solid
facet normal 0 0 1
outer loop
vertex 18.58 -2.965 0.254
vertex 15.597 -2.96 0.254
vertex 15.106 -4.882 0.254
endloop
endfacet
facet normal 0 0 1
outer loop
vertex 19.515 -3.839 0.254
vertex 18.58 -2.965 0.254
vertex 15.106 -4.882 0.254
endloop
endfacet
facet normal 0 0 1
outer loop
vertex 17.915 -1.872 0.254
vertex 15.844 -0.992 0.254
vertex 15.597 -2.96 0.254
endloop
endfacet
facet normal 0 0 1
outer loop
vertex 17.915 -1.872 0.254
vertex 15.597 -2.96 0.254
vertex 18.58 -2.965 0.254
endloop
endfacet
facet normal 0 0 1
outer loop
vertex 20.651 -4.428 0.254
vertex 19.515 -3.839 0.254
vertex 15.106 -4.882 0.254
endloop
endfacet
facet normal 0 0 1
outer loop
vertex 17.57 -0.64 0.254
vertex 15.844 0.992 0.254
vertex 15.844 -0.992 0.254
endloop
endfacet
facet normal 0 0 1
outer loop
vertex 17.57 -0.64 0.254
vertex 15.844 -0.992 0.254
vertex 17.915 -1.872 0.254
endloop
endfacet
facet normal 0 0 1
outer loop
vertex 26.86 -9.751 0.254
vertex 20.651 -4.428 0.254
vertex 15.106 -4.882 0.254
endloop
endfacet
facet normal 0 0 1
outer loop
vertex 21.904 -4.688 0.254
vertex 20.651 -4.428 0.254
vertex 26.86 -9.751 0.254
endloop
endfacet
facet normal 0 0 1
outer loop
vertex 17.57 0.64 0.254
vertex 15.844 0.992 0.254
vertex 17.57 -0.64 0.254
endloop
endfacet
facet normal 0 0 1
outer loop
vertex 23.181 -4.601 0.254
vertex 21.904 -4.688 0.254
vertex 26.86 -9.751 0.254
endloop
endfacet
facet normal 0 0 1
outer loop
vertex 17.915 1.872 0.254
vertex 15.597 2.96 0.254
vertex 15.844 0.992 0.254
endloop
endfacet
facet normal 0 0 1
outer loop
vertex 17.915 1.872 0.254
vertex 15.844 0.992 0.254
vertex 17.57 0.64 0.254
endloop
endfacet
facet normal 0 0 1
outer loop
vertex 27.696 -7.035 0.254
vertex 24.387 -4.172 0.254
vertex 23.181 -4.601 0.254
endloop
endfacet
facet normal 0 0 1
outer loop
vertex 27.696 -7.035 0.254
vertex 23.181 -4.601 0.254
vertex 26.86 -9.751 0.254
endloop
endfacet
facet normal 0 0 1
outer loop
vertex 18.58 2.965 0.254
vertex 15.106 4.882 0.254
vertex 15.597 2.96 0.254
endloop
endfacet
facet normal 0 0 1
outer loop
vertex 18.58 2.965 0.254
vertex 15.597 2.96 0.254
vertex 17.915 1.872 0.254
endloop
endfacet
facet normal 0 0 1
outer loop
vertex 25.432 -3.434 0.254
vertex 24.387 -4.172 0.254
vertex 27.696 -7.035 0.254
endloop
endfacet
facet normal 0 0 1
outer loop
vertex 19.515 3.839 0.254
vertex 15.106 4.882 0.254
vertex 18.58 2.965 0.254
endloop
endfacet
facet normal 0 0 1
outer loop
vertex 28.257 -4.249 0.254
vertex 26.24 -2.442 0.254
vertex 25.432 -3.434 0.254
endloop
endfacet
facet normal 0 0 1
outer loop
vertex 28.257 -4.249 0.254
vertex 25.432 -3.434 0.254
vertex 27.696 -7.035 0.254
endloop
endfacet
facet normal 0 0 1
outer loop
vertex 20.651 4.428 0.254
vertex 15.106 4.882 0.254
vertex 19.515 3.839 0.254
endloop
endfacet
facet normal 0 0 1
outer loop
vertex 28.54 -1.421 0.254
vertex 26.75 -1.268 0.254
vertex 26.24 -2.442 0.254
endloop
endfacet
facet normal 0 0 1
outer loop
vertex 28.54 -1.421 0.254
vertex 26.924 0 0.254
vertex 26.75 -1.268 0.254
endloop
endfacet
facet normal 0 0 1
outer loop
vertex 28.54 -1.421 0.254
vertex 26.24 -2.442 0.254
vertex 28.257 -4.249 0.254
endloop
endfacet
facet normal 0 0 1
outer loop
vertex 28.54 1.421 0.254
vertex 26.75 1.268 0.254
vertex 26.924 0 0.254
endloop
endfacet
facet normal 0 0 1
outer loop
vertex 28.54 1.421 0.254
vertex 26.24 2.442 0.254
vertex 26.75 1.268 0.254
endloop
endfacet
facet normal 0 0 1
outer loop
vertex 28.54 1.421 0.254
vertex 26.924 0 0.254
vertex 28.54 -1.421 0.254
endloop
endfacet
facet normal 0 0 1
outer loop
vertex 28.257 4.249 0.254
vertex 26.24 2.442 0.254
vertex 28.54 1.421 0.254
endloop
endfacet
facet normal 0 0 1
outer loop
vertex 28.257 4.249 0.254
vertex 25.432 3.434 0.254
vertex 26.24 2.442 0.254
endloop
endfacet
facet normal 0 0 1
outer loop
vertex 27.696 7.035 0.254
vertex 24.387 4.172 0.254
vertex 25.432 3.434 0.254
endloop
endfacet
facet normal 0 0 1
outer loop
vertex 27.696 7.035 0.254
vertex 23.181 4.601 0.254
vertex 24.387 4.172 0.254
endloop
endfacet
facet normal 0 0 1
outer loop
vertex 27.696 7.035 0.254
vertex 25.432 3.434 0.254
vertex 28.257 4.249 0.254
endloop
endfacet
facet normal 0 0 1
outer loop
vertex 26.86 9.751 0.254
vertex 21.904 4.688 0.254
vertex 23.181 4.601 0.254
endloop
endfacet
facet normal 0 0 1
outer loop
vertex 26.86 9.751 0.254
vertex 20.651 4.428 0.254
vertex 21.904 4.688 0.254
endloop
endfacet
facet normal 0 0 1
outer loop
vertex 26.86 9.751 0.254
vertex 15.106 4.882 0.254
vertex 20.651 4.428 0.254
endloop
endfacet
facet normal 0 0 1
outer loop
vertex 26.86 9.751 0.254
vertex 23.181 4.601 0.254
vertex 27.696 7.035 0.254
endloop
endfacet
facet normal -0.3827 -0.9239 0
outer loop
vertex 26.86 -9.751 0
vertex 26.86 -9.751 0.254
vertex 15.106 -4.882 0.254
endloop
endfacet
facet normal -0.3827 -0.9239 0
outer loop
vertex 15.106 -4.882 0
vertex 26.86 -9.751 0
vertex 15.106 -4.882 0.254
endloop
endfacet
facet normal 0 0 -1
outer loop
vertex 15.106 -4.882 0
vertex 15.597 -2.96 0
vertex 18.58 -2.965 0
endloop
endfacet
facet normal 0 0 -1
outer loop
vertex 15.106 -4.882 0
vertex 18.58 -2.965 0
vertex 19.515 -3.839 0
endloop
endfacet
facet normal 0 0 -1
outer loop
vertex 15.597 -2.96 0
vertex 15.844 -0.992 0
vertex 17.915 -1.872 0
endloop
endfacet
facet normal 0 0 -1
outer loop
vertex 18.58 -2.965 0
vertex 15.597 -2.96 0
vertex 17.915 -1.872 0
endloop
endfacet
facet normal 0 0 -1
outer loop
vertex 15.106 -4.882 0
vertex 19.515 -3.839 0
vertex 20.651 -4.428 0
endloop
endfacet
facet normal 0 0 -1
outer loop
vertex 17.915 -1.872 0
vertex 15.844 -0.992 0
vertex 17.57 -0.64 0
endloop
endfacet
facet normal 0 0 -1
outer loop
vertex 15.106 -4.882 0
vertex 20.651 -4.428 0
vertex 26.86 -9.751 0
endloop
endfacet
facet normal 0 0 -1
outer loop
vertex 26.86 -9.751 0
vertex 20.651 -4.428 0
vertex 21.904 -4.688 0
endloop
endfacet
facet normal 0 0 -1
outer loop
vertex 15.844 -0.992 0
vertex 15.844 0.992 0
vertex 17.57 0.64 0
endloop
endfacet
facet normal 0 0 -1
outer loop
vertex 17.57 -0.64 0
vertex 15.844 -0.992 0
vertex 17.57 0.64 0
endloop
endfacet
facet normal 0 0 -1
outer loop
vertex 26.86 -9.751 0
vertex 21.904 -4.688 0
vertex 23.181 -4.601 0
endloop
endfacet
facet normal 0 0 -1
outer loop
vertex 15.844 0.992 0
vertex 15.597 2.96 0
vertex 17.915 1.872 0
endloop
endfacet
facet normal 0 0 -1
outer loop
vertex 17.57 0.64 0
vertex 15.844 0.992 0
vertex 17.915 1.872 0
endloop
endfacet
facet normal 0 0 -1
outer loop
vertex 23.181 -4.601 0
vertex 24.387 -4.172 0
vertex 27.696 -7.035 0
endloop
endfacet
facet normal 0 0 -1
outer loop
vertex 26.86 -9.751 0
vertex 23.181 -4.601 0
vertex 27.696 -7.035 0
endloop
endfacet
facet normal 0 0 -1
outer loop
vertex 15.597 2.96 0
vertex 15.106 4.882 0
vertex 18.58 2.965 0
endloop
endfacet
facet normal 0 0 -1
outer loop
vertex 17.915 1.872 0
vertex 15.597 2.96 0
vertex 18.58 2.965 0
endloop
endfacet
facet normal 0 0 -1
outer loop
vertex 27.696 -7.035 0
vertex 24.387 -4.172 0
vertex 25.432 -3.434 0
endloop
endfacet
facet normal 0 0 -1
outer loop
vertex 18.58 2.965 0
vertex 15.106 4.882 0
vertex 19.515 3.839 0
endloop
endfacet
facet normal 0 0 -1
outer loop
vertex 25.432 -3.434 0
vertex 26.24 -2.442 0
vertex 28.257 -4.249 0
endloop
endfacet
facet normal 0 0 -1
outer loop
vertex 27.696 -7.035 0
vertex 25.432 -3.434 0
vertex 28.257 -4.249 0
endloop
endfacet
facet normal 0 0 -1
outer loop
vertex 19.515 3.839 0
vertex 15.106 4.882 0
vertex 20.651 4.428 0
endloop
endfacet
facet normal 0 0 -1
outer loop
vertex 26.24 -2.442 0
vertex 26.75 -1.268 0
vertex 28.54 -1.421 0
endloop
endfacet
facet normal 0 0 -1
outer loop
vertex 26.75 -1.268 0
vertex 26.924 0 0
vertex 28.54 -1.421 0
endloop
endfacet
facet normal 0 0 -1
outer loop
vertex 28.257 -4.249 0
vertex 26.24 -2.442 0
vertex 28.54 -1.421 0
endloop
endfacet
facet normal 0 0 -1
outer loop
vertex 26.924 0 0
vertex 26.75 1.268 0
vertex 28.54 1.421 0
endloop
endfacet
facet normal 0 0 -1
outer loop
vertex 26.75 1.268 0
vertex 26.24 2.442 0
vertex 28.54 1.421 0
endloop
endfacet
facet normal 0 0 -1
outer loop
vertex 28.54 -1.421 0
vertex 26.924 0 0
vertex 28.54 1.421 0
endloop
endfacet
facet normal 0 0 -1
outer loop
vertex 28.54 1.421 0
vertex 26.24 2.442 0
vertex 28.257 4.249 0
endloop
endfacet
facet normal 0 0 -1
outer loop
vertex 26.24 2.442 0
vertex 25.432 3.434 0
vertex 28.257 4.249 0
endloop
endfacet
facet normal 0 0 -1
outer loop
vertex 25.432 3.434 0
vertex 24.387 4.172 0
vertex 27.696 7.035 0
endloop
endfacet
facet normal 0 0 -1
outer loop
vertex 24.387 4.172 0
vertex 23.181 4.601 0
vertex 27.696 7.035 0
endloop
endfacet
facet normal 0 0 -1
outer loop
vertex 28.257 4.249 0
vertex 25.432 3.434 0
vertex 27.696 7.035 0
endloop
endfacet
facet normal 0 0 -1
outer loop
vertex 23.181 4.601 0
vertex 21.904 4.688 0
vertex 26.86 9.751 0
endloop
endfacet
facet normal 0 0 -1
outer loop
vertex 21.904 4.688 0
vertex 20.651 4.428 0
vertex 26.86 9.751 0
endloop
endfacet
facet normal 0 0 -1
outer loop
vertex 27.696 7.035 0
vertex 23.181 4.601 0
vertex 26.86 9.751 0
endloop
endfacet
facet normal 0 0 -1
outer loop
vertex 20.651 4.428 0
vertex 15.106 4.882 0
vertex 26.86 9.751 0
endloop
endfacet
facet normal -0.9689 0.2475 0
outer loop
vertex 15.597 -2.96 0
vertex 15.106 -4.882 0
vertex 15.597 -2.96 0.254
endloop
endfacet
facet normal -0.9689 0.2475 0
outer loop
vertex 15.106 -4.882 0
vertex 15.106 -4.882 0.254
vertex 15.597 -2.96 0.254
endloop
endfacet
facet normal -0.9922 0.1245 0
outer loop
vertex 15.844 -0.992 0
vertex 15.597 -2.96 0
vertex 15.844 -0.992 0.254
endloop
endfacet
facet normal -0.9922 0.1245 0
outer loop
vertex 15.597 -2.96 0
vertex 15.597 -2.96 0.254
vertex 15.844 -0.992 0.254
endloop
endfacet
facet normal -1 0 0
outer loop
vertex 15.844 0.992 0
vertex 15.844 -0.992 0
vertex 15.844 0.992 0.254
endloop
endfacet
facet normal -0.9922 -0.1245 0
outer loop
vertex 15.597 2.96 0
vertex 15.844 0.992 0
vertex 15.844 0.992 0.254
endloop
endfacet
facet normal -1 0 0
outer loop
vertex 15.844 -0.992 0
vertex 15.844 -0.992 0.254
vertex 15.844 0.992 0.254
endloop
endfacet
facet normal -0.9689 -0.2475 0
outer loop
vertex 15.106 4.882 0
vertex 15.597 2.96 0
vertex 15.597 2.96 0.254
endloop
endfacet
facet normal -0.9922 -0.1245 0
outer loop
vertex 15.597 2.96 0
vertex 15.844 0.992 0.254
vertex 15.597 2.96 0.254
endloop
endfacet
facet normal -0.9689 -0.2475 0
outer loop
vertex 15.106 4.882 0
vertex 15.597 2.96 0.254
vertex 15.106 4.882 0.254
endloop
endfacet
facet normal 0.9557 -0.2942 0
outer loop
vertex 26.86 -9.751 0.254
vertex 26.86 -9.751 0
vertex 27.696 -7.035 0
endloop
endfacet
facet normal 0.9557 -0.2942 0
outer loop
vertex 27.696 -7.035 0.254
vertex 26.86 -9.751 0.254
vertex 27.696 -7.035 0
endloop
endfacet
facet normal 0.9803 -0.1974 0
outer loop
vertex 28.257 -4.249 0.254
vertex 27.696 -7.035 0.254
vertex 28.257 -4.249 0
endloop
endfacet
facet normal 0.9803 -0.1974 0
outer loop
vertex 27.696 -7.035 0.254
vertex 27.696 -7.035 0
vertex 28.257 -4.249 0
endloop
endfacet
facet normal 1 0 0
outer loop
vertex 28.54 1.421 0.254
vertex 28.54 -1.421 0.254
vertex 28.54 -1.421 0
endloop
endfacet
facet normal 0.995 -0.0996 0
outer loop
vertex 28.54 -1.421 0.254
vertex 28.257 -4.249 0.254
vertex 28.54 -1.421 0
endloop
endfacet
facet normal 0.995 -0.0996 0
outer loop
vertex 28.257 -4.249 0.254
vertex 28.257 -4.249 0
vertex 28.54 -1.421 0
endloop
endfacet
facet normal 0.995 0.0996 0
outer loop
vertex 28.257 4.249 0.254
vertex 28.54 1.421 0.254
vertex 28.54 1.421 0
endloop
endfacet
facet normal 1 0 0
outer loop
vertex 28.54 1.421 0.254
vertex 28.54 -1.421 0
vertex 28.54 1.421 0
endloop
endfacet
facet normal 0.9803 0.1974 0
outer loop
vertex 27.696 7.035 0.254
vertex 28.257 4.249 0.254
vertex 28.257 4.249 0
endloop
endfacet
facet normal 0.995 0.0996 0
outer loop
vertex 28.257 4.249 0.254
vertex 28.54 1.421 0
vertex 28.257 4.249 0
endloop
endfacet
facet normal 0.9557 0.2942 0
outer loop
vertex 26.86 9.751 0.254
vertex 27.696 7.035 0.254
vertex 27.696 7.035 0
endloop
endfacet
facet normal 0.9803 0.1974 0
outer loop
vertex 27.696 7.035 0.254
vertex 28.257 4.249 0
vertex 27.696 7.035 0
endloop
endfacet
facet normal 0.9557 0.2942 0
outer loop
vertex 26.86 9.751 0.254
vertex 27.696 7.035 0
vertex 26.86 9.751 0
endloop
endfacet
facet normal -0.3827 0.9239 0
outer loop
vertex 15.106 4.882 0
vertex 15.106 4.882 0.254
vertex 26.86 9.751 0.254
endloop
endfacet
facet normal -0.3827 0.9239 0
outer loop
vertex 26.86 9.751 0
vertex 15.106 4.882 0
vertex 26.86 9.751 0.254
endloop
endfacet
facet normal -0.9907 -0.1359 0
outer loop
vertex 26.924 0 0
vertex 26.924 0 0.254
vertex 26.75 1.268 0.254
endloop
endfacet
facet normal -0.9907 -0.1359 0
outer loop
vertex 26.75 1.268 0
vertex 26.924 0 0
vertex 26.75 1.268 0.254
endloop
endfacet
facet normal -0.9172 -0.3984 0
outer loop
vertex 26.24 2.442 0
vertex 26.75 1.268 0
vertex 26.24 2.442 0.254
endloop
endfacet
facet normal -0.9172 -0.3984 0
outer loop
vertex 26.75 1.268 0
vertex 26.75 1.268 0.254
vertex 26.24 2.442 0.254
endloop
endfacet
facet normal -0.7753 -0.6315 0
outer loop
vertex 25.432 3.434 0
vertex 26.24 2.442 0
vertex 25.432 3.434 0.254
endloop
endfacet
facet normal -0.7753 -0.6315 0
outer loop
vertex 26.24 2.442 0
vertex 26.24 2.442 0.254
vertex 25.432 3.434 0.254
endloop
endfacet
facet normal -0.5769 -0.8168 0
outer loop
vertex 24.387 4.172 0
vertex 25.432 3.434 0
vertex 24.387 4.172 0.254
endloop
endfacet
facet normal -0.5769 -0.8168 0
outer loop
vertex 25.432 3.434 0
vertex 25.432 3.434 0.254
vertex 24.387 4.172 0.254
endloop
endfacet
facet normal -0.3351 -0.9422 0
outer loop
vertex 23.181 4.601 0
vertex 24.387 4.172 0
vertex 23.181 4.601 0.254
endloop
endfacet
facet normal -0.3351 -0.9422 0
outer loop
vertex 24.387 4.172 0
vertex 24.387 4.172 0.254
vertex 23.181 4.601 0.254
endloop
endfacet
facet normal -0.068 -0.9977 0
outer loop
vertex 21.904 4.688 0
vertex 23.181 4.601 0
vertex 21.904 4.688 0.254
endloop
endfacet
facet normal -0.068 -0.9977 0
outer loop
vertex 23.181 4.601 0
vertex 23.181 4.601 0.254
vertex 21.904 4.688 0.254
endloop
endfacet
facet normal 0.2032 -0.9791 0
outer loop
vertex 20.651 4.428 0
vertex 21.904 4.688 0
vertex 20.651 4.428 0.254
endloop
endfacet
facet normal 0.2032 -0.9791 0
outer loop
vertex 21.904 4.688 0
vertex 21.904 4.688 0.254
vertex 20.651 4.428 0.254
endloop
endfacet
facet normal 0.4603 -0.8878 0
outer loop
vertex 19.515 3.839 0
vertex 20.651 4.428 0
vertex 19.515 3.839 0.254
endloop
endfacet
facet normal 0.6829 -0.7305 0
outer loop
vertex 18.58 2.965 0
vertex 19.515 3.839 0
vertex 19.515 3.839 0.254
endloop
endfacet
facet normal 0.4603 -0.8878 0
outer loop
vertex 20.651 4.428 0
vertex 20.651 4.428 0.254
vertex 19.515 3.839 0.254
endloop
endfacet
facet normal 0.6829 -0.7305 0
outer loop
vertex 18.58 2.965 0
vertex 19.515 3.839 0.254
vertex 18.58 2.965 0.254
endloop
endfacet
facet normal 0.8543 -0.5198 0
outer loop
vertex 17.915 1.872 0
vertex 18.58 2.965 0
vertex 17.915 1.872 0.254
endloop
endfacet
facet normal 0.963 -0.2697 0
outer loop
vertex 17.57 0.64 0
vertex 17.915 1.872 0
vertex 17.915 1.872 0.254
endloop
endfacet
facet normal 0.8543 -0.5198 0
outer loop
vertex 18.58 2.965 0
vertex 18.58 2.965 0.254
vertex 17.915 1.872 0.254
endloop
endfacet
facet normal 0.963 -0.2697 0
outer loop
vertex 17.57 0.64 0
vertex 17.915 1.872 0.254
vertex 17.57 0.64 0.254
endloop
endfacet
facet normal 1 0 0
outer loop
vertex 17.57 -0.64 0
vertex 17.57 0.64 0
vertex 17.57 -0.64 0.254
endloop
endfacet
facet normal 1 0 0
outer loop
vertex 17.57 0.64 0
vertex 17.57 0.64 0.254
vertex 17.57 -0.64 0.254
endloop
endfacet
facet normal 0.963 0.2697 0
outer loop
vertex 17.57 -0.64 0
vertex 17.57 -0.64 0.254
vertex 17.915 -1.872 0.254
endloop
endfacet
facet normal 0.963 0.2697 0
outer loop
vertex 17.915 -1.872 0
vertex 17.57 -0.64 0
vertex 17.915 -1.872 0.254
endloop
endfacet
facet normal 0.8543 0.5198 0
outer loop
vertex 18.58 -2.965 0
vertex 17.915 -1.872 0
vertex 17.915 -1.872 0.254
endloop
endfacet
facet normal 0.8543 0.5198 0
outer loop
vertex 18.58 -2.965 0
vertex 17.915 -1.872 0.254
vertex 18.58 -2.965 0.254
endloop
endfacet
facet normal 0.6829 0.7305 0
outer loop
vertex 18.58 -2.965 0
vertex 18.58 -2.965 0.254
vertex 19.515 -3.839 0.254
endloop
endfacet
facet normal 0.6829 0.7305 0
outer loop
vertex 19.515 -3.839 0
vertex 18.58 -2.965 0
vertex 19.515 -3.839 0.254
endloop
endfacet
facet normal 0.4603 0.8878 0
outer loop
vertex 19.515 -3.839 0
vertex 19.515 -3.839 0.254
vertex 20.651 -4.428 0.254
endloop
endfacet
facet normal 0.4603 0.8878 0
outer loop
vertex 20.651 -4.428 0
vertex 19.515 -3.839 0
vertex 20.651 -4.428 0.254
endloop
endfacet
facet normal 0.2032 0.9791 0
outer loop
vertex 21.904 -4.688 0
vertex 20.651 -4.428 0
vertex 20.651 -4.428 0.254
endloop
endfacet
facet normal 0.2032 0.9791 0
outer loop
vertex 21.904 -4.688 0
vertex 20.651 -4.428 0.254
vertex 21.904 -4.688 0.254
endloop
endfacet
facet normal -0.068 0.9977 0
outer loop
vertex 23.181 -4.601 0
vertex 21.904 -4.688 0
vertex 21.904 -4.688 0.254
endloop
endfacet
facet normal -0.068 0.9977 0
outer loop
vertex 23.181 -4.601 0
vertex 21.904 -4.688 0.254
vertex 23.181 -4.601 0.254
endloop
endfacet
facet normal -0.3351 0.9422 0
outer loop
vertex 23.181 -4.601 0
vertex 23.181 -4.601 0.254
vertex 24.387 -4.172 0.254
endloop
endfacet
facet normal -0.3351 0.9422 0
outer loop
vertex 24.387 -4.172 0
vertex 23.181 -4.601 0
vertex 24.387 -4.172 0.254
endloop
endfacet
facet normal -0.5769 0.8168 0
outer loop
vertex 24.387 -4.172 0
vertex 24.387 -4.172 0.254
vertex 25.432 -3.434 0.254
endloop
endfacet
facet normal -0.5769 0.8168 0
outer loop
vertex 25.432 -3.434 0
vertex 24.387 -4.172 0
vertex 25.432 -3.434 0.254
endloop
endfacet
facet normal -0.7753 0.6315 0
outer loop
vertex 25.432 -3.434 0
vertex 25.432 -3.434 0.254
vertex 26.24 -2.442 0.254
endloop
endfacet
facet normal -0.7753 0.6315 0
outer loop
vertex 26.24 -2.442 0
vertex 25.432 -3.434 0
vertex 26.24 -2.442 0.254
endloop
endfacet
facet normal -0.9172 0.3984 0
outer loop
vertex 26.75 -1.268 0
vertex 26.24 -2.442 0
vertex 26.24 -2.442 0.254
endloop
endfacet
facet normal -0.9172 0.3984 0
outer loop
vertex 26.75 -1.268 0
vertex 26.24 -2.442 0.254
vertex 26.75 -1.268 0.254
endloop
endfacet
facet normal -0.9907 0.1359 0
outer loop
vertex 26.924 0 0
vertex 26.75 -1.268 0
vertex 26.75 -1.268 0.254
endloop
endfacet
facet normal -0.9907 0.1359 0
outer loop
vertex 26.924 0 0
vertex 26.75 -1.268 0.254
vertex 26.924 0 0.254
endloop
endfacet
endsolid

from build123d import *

# Parameters (mm, degrees)
SKETCH4_R           = 28.575
BOSS_EXTRUDE2_DEPTH = 0.254
SKETCH5_R           = 15.875
CUT_EXTRUDE5_DEPTH  = 1.254
SKETCH6_R           = 4.699
CUT_EXTRUDE6_DEPTH  = 1.254
SKETCH8_OUTSIDE_W   = 75.314
SKETCH8_OUTSIDE_H   = 75.314
CUT_EXTRUDE11_DEPTH = 1.254


with BuildPart() as part:
    # Sketch4 → Boss-Extrude2 (new body)
    with BuildSketch(Plane.XY):
        Circle(SKETCH4_R)
    extrude(amount=BOSS_EXTRUDE2_DEPTH)

    # Sketch5 → Cut-Extrude5 (cut, through all)
    with BuildSketch(Plane.XY.offset(0.254)):
        Circle(SKETCH5_R)
    extrude(amount=-CUT_EXTRUDE5_DEPTH, mode=Mode.SUBTRACT)

    # Sketch6 → Cut-Extrude6 (cut, through all)
    with BuildSketch(Plane.XY.offset(0.254)):
        with Locations((22.225, 0)):
            Circle(SKETCH6_R)
    extrude(amount=-CUT_EXTRUDE6_DEPTH, mode=Mode.SUBTRACT)

    # Sketch8 outside → Cut-Extrude11 (cut, through all)
    with BuildSketch(Plane.XY.offset(0.254)):
        Rectangle(SKETCH8_OUTSIDE_W, SKETCH8_OUTSIDE_H)
        with BuildLine():
            Line((15.105587123, 4.88230096), (26.859778778, 9.751046558))
            ThreePointArc((26.859778778, 9.751046558), (28.575, 0), (26.859778778, -9.751046558))
            Line((26.859778778, -9.751046558), (15.105587123, -4.88230096))
            ThreePointArc((15.105587123, -4.88230096), (15.875, 0), (15.105587123, 4.88230096))
        make_face(mode=Mode.SUBTRACT)
    extrude(amount=-CUT_EXTRUDE11_DEPTH, mode=Mode.SUBTRACT)


solid = part.part
